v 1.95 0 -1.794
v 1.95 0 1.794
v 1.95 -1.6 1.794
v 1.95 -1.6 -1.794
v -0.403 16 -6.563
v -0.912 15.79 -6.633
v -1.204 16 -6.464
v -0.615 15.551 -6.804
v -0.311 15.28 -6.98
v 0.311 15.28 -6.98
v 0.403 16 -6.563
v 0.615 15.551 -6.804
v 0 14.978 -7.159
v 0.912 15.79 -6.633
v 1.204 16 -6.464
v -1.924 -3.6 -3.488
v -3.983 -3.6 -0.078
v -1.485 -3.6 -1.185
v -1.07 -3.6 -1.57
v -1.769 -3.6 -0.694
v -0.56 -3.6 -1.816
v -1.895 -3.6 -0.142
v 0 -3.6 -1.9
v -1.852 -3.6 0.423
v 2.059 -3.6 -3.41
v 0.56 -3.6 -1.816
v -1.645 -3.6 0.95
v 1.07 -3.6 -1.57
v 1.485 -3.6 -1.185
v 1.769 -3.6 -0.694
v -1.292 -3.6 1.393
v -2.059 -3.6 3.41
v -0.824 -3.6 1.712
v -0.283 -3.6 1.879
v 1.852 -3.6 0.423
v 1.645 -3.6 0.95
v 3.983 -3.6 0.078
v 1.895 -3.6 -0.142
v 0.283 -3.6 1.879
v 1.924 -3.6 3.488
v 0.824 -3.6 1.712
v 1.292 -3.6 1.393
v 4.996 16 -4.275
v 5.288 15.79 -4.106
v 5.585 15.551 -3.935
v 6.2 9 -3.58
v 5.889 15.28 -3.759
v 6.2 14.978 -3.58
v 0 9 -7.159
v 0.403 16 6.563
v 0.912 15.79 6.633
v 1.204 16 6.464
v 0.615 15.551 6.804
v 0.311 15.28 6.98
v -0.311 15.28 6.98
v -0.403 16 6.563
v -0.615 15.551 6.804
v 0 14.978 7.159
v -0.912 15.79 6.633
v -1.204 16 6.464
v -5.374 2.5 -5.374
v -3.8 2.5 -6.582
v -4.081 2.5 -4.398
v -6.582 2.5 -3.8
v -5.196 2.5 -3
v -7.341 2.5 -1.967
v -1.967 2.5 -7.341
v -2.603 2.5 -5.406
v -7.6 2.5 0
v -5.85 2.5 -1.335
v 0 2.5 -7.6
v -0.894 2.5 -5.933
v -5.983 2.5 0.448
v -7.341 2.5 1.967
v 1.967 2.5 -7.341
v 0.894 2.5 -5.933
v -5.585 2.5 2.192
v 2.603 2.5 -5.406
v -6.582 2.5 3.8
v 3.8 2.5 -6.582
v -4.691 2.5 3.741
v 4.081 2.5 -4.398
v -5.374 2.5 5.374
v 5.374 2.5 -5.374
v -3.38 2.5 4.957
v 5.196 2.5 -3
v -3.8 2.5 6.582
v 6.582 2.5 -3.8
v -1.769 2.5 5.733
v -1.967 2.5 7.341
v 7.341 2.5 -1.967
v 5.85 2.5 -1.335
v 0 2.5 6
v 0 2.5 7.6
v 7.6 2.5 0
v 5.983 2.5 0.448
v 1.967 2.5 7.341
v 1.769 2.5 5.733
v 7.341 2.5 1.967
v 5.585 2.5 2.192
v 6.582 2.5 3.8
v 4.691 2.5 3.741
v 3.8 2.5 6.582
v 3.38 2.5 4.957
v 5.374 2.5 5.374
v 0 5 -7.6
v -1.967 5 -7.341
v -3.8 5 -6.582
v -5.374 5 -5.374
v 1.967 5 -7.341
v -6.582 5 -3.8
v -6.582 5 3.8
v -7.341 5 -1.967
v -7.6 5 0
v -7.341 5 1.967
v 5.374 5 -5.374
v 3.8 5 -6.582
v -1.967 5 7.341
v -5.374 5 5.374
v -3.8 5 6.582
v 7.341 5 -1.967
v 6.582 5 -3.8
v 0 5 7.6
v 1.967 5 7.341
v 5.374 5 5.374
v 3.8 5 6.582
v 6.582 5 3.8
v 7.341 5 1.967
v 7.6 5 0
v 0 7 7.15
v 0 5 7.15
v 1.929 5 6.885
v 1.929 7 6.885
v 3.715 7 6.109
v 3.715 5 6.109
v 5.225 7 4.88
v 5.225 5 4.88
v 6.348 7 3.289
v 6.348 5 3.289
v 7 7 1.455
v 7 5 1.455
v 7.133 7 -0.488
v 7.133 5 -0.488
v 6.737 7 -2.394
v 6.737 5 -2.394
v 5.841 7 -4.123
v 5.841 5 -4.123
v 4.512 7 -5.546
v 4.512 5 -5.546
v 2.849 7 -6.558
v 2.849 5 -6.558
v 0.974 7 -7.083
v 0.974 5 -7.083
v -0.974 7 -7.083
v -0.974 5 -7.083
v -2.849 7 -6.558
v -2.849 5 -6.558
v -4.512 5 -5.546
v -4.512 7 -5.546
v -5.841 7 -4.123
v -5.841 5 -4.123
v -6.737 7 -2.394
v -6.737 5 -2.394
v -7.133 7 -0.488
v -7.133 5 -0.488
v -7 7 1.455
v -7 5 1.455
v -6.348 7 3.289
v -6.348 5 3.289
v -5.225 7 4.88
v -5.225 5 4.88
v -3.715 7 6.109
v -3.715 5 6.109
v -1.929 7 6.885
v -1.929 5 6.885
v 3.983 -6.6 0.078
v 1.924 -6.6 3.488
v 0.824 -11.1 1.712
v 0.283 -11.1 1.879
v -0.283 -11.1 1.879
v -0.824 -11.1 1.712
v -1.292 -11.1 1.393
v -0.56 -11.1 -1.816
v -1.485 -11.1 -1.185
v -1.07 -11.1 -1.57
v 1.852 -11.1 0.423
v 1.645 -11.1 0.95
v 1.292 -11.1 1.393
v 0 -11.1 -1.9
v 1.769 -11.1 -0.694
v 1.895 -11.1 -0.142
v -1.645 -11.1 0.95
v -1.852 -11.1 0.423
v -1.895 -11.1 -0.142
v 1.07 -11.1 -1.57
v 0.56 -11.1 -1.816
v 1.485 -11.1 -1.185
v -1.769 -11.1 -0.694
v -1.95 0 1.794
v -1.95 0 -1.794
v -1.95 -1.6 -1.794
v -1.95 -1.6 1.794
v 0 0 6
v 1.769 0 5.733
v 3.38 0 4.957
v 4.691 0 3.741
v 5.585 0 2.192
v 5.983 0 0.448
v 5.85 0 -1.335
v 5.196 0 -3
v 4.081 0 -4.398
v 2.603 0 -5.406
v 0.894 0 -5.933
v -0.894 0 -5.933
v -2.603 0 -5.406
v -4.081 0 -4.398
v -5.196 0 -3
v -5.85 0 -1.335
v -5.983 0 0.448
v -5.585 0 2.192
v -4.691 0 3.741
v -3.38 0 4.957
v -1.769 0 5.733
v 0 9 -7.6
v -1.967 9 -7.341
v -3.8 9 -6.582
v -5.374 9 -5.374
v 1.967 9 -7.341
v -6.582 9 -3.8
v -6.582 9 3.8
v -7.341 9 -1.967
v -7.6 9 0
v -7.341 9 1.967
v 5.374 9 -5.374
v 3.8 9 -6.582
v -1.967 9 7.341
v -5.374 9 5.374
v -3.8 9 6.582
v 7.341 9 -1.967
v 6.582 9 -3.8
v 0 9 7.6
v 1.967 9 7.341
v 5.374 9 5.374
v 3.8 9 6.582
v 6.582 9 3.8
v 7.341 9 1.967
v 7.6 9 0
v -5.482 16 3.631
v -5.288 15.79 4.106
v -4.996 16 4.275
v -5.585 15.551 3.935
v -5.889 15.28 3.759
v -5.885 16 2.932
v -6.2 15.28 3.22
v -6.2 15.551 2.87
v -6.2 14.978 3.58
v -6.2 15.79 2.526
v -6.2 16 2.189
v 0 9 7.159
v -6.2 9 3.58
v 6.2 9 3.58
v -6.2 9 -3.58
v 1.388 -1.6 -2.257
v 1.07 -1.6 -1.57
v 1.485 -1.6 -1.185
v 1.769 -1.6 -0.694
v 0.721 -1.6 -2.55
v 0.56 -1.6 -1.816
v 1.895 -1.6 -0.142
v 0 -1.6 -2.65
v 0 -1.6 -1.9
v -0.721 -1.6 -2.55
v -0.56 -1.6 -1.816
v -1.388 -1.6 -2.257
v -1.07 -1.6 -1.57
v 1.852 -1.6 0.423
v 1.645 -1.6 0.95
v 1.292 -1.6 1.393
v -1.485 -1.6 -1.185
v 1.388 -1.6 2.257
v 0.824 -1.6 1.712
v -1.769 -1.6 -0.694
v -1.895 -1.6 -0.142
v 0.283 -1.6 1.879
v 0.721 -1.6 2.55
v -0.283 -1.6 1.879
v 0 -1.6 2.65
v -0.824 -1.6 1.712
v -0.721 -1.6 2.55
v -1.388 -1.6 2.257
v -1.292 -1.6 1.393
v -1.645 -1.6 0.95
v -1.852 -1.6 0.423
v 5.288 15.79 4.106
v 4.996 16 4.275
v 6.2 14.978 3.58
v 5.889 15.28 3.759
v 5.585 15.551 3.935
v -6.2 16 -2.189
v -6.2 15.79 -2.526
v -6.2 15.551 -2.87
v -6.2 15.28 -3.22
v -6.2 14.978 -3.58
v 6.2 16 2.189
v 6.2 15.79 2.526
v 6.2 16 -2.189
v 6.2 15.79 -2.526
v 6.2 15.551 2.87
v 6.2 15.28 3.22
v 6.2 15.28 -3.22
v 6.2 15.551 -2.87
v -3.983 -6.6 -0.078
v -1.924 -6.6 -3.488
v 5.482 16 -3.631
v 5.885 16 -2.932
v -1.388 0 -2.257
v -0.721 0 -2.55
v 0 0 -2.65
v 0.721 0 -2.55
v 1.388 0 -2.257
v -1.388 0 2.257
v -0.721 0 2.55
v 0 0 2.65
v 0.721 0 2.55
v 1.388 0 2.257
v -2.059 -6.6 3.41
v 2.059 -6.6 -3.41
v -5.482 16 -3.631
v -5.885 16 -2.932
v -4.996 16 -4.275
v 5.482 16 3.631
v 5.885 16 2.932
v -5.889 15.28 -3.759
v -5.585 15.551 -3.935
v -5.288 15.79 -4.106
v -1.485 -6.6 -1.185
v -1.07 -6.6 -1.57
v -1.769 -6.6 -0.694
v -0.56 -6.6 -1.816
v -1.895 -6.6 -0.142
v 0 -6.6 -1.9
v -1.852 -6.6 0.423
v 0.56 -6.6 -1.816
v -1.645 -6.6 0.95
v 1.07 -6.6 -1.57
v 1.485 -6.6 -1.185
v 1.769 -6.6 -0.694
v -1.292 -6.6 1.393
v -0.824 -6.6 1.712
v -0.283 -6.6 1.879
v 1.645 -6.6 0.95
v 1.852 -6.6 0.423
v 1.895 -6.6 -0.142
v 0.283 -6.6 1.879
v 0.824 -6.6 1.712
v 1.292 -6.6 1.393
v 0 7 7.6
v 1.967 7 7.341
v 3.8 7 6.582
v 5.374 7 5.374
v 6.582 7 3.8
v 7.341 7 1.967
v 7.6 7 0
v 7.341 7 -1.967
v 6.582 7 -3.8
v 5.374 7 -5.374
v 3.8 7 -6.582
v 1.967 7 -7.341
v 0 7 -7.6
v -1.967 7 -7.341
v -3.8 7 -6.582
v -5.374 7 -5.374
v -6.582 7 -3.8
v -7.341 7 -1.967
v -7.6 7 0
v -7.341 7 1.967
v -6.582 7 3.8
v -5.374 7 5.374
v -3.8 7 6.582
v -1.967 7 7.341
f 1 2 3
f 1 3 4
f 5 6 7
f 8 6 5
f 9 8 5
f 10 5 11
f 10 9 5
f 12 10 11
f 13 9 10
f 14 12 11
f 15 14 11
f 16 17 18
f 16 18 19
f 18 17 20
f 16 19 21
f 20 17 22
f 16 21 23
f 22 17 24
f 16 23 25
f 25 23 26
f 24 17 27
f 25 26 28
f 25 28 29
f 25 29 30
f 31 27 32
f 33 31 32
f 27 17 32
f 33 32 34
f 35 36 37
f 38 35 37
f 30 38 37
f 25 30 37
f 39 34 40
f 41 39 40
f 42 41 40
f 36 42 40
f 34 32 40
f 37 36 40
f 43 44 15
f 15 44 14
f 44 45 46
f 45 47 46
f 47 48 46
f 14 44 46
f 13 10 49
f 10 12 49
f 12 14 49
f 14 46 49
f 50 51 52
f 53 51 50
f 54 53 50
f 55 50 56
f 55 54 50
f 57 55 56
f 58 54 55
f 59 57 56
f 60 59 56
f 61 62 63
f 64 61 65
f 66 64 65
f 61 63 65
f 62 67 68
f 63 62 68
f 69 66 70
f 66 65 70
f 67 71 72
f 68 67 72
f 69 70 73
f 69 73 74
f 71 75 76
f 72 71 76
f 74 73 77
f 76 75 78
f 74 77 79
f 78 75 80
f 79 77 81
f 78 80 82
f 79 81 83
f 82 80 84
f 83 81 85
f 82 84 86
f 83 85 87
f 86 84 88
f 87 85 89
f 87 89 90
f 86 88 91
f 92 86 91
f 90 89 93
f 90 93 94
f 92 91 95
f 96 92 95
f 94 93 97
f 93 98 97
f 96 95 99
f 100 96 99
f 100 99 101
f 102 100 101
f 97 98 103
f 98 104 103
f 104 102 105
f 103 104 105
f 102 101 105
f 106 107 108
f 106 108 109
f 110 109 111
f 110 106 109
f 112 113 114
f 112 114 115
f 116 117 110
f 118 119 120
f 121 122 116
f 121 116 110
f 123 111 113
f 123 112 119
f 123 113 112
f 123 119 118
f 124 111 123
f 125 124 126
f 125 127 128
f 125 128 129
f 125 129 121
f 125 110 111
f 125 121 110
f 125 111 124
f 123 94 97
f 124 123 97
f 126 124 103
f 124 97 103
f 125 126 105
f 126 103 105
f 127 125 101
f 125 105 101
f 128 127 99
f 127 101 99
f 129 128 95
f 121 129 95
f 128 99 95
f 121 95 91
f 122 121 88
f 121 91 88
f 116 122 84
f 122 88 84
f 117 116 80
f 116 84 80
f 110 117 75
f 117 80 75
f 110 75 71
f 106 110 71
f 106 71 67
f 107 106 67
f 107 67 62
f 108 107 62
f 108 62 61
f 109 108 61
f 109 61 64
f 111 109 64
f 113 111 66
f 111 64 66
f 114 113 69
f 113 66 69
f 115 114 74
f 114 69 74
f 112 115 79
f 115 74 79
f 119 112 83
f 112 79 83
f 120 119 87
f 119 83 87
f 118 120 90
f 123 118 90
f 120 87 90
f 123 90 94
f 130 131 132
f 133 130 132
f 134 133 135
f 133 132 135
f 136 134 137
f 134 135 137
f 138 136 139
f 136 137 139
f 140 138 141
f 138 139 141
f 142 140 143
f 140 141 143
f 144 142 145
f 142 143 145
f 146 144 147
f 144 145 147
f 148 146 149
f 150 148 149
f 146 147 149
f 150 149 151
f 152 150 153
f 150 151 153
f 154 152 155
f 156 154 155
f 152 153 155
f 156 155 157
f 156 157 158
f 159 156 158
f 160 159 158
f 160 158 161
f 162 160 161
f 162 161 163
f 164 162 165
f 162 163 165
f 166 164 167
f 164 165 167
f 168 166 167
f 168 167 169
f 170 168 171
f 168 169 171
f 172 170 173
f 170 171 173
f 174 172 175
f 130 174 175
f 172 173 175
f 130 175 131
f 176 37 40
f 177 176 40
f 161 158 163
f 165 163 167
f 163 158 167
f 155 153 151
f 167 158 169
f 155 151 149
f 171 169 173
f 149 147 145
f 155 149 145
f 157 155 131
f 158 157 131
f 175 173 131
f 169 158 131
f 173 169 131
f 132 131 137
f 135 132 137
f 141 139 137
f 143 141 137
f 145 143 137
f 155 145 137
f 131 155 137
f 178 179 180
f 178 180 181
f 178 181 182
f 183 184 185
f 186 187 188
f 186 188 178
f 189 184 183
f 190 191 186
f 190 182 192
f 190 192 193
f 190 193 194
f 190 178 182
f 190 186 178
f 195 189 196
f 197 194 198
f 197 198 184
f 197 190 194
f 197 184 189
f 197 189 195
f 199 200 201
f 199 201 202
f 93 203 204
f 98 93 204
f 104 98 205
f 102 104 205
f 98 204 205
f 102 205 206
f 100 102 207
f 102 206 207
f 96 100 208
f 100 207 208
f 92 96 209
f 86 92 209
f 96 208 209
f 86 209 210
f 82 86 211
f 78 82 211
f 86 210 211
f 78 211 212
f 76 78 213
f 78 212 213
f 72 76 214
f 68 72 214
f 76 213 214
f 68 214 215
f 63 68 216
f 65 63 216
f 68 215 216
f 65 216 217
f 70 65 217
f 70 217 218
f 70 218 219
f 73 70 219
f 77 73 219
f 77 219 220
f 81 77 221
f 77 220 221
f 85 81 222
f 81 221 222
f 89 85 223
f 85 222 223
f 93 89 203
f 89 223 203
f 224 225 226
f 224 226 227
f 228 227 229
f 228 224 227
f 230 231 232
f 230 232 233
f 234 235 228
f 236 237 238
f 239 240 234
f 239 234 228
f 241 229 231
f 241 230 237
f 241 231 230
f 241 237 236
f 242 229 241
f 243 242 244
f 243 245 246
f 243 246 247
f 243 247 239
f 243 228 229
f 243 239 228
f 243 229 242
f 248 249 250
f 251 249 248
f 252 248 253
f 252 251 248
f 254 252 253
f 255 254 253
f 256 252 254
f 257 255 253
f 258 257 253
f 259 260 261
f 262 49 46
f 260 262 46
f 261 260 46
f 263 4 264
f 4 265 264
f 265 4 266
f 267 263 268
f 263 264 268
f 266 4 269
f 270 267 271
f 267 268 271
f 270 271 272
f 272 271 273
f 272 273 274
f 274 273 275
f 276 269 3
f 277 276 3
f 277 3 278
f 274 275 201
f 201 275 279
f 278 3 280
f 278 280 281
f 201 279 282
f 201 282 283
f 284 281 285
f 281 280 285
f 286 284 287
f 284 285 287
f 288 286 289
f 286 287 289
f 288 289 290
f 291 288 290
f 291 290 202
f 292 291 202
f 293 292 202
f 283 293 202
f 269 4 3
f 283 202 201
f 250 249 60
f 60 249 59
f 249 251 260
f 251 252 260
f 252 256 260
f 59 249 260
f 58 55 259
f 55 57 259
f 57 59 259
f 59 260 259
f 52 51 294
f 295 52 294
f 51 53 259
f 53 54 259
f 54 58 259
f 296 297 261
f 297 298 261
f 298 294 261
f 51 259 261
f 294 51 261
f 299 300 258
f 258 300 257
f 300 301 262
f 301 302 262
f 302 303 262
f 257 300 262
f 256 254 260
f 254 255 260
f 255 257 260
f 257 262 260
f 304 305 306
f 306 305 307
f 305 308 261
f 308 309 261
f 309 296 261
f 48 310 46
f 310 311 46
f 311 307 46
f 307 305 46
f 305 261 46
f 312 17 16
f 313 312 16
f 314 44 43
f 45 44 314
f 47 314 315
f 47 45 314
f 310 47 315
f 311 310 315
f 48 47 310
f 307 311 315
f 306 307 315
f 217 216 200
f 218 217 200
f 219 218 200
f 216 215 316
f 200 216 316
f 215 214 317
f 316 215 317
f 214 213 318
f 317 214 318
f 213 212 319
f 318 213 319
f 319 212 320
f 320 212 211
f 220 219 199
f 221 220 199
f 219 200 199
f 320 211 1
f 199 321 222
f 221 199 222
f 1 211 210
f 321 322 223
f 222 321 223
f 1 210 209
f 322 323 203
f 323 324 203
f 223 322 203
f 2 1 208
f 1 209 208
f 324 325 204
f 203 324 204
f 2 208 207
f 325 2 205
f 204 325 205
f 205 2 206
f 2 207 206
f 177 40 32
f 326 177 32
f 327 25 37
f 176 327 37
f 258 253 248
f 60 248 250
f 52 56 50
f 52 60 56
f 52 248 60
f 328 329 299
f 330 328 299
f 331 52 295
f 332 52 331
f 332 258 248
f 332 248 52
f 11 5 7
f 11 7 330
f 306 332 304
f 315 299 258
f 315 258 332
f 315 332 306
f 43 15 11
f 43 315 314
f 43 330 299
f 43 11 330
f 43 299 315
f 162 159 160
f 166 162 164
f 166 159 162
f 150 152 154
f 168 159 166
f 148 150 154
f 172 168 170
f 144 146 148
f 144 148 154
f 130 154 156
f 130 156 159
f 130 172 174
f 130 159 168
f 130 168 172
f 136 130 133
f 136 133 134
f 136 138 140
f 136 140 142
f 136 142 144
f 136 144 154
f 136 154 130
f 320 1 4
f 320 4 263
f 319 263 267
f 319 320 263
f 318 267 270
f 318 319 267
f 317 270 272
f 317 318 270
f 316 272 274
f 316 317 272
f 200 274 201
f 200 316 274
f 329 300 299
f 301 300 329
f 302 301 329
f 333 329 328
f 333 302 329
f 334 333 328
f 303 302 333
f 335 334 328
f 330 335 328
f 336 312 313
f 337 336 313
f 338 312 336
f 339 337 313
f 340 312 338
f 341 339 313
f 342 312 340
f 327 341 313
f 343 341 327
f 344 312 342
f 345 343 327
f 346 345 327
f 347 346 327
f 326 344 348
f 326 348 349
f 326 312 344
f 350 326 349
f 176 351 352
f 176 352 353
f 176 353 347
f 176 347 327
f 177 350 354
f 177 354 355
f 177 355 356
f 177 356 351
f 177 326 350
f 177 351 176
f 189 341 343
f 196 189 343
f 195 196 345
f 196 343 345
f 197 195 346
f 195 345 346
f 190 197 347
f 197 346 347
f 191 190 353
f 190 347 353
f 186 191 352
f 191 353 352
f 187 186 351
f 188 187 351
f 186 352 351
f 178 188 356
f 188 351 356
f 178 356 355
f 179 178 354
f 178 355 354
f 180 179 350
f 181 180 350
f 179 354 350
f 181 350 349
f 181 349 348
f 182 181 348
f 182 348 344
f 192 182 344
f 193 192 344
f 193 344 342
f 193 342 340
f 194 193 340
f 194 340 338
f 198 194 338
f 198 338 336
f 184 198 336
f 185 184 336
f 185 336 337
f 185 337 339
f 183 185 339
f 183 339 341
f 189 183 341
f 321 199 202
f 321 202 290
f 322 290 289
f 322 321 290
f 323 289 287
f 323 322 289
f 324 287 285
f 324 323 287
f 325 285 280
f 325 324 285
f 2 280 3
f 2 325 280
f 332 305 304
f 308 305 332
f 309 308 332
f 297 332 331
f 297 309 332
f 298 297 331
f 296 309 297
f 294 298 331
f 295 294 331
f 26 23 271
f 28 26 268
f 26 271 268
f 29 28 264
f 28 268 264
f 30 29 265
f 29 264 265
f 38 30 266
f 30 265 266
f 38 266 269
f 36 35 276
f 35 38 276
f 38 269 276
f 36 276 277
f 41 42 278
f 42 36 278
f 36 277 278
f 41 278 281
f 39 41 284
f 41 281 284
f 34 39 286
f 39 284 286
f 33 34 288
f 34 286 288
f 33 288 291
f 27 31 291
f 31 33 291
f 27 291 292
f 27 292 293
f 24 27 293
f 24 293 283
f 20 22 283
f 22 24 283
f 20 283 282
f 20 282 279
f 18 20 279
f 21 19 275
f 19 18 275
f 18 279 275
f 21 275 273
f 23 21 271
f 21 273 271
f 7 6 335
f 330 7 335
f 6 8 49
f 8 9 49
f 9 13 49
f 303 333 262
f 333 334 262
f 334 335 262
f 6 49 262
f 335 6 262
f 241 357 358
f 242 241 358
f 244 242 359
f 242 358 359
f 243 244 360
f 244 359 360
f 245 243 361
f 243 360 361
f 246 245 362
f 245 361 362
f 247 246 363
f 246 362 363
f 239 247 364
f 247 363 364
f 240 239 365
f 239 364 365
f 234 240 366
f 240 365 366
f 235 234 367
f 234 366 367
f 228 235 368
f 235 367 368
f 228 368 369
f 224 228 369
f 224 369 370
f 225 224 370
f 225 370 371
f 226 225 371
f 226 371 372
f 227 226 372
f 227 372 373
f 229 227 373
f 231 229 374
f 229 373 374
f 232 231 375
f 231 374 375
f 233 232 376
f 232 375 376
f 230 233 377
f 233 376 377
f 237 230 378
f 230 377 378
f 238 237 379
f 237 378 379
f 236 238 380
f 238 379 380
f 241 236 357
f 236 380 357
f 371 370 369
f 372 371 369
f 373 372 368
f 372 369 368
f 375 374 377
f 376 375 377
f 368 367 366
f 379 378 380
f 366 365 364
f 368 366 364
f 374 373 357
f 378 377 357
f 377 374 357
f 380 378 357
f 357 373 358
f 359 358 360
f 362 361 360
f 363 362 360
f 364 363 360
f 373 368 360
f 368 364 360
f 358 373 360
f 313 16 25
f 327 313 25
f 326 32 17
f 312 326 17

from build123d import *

# Parameters (mm, degrees)
SKETCH_1_R      = 6
EXTRUDE_1_DEPTH = 2.5
SKETCH_2_R      = 7.6
EXTRUDE_2_DEPTH = 2.5
SKETCH_3_R      = 7.15
EXTRUDE_3_DEPTH = 2
SKETCH_4_R      = 7.6
EXTRUDE_4_DEPTH = 2
EXTRUDE_5_DEPTH = 7
EXTRUDE_6_DEPTH = 1.6
SKETCH_9_R      = 1.9
EXTRUDE_7_DEPTH = 9.5
EXTRUDE_START   = 2
EXTRUDE_8_DEPTH = 3


with BuildPart() as part:
    # 草图1 → 凸台-拉伸1 (new body)
    with BuildSketch(Plane(origin=(0, 0, 0), x_dir=(1, 0, 0), z_dir=(0, 1, 0))):
        with Locations(Location((0, 0, 0), (0, 0, 270))):
            Circle(SKETCH_1_R)
    extrude(amount=EXTRUDE_1_DEPTH)

    # 草图2 → 凸台-拉伸2 (add)
    with BuildSketch(Plane(origin=(0, 2.5, 0), x_dir=(1, 0, 0), z_dir=(0, 1, 0))):
        with Locations(Location((0, 0, 0), (0, 0, 270))):
            Circle(SKETCH_2_R)
    extrude(amount=EXTRUDE_2_DEPTH)

    # 草图8 → 凸台-拉伸6 (add)
    with BuildSketch(Plane.XZ):
        with BuildLine():
            Line((1.95, 1.794435844), (1.95, -1.794435844))
            ThreePointArc((1.95, -1.794435844), (0, -2.65), (-1.95, -1.794435844))
            Line((-1.95, -1.794435844), (-1.95, 1.794435844))
            ThreePointArc((-1.95, 1.794435844), (0, 2.65), (1.95, 1.794435844))
        make_face()
    extrude(amount=EXTRUDE_6_DEPTH)

    # 草图9 → 凸台-拉伸7 (add)
    with BuildSketch(Plane.XZ.offset(1.6)):
        with Locations(Location((0, 0, 0), (0, 0, 270))):
            Circle(SKETCH_9_R)
    extrude(amount=EXTRUDE_7_DEPTH)

    # 草图10 → 凸台-拉伸8 (add)
    with BuildSketch(Plane.XZ.offset(1.6).offset(EXTRUDE_START)):
        Polygon((1.923967995, 3.488315805), (-2.058986106, 3.410363062), (-3.982954101, -0.077952742), (-1.923967995, -3.488315805), (2.058986106, -3.410363062), (3.982954101, 0.077952742), align=None)
    extrude(amount=EXTRUDE_8_DEPTH)


with BuildPart() as body_2:
    # 草图3 → 凸台-拉伸3 (new body)
    with BuildSketch(Plane(origin=(0, 5, 0), x_dir=(1, 0, 0), z_dir=(0, 1, 0))):
        with Locations(Location((0, 0, 0), (0, 0, 270))):
            Circle(SKETCH_3_R)
    extrude(amount=EXTRUDE_3_DEPTH)


with BuildPart() as body_3:
    # 草图4 → 凸台-拉伸4 (new body)
    with BuildSketch(Plane(origin=(0, 7, 0), x_dir=(1, 0, 0), z_dir=(0, 1, 0))):
        with Locations(Location((0, 0, 0), (0, 0, 270))):
            Circle(SKETCH_4_R)
    extrude(amount=EXTRUDE_4_DEPTH)


with BuildPart() as body_4:
    # 草图5 → 凸台-拉伸5 (new body)
    with BuildSketch(Plane(origin=(0, 9, 0), x_dir=(1, 0, 0), z_dir=(0, 1, 0))):
        Polygon((0, 7.159143338), (-6.2, 3.579571669), (-6.2, -3.579571669), (0, -7.159143338), (6.2, -3.579571669), (6.2, 3.579571669), align=None)
    extrude(amount=EXTRUDE_5_DEPTH)

    # 草图7 → 切除-旋转2 (revolve, cut)
    with BuildSketch(Plane(origin=(0, 0, 0), x_dir=(0.8660254037844386, 0, 0.5000000000000003), z_dir=(-0.5000000000000002, 0, 0.8660254037844385))):
        Polygon((-6.20982582, 16.639779846), (-7.441584726, 14.4830693), (-8.216009298, 16.639779846), align=None)
    revolve(axis=Axis((0, 16, 0), (0, -1, 0)), mode=Mode.SUBTRACT)


solid = Compound([part.part, body_2.part, body_3.part, body_4.part])
